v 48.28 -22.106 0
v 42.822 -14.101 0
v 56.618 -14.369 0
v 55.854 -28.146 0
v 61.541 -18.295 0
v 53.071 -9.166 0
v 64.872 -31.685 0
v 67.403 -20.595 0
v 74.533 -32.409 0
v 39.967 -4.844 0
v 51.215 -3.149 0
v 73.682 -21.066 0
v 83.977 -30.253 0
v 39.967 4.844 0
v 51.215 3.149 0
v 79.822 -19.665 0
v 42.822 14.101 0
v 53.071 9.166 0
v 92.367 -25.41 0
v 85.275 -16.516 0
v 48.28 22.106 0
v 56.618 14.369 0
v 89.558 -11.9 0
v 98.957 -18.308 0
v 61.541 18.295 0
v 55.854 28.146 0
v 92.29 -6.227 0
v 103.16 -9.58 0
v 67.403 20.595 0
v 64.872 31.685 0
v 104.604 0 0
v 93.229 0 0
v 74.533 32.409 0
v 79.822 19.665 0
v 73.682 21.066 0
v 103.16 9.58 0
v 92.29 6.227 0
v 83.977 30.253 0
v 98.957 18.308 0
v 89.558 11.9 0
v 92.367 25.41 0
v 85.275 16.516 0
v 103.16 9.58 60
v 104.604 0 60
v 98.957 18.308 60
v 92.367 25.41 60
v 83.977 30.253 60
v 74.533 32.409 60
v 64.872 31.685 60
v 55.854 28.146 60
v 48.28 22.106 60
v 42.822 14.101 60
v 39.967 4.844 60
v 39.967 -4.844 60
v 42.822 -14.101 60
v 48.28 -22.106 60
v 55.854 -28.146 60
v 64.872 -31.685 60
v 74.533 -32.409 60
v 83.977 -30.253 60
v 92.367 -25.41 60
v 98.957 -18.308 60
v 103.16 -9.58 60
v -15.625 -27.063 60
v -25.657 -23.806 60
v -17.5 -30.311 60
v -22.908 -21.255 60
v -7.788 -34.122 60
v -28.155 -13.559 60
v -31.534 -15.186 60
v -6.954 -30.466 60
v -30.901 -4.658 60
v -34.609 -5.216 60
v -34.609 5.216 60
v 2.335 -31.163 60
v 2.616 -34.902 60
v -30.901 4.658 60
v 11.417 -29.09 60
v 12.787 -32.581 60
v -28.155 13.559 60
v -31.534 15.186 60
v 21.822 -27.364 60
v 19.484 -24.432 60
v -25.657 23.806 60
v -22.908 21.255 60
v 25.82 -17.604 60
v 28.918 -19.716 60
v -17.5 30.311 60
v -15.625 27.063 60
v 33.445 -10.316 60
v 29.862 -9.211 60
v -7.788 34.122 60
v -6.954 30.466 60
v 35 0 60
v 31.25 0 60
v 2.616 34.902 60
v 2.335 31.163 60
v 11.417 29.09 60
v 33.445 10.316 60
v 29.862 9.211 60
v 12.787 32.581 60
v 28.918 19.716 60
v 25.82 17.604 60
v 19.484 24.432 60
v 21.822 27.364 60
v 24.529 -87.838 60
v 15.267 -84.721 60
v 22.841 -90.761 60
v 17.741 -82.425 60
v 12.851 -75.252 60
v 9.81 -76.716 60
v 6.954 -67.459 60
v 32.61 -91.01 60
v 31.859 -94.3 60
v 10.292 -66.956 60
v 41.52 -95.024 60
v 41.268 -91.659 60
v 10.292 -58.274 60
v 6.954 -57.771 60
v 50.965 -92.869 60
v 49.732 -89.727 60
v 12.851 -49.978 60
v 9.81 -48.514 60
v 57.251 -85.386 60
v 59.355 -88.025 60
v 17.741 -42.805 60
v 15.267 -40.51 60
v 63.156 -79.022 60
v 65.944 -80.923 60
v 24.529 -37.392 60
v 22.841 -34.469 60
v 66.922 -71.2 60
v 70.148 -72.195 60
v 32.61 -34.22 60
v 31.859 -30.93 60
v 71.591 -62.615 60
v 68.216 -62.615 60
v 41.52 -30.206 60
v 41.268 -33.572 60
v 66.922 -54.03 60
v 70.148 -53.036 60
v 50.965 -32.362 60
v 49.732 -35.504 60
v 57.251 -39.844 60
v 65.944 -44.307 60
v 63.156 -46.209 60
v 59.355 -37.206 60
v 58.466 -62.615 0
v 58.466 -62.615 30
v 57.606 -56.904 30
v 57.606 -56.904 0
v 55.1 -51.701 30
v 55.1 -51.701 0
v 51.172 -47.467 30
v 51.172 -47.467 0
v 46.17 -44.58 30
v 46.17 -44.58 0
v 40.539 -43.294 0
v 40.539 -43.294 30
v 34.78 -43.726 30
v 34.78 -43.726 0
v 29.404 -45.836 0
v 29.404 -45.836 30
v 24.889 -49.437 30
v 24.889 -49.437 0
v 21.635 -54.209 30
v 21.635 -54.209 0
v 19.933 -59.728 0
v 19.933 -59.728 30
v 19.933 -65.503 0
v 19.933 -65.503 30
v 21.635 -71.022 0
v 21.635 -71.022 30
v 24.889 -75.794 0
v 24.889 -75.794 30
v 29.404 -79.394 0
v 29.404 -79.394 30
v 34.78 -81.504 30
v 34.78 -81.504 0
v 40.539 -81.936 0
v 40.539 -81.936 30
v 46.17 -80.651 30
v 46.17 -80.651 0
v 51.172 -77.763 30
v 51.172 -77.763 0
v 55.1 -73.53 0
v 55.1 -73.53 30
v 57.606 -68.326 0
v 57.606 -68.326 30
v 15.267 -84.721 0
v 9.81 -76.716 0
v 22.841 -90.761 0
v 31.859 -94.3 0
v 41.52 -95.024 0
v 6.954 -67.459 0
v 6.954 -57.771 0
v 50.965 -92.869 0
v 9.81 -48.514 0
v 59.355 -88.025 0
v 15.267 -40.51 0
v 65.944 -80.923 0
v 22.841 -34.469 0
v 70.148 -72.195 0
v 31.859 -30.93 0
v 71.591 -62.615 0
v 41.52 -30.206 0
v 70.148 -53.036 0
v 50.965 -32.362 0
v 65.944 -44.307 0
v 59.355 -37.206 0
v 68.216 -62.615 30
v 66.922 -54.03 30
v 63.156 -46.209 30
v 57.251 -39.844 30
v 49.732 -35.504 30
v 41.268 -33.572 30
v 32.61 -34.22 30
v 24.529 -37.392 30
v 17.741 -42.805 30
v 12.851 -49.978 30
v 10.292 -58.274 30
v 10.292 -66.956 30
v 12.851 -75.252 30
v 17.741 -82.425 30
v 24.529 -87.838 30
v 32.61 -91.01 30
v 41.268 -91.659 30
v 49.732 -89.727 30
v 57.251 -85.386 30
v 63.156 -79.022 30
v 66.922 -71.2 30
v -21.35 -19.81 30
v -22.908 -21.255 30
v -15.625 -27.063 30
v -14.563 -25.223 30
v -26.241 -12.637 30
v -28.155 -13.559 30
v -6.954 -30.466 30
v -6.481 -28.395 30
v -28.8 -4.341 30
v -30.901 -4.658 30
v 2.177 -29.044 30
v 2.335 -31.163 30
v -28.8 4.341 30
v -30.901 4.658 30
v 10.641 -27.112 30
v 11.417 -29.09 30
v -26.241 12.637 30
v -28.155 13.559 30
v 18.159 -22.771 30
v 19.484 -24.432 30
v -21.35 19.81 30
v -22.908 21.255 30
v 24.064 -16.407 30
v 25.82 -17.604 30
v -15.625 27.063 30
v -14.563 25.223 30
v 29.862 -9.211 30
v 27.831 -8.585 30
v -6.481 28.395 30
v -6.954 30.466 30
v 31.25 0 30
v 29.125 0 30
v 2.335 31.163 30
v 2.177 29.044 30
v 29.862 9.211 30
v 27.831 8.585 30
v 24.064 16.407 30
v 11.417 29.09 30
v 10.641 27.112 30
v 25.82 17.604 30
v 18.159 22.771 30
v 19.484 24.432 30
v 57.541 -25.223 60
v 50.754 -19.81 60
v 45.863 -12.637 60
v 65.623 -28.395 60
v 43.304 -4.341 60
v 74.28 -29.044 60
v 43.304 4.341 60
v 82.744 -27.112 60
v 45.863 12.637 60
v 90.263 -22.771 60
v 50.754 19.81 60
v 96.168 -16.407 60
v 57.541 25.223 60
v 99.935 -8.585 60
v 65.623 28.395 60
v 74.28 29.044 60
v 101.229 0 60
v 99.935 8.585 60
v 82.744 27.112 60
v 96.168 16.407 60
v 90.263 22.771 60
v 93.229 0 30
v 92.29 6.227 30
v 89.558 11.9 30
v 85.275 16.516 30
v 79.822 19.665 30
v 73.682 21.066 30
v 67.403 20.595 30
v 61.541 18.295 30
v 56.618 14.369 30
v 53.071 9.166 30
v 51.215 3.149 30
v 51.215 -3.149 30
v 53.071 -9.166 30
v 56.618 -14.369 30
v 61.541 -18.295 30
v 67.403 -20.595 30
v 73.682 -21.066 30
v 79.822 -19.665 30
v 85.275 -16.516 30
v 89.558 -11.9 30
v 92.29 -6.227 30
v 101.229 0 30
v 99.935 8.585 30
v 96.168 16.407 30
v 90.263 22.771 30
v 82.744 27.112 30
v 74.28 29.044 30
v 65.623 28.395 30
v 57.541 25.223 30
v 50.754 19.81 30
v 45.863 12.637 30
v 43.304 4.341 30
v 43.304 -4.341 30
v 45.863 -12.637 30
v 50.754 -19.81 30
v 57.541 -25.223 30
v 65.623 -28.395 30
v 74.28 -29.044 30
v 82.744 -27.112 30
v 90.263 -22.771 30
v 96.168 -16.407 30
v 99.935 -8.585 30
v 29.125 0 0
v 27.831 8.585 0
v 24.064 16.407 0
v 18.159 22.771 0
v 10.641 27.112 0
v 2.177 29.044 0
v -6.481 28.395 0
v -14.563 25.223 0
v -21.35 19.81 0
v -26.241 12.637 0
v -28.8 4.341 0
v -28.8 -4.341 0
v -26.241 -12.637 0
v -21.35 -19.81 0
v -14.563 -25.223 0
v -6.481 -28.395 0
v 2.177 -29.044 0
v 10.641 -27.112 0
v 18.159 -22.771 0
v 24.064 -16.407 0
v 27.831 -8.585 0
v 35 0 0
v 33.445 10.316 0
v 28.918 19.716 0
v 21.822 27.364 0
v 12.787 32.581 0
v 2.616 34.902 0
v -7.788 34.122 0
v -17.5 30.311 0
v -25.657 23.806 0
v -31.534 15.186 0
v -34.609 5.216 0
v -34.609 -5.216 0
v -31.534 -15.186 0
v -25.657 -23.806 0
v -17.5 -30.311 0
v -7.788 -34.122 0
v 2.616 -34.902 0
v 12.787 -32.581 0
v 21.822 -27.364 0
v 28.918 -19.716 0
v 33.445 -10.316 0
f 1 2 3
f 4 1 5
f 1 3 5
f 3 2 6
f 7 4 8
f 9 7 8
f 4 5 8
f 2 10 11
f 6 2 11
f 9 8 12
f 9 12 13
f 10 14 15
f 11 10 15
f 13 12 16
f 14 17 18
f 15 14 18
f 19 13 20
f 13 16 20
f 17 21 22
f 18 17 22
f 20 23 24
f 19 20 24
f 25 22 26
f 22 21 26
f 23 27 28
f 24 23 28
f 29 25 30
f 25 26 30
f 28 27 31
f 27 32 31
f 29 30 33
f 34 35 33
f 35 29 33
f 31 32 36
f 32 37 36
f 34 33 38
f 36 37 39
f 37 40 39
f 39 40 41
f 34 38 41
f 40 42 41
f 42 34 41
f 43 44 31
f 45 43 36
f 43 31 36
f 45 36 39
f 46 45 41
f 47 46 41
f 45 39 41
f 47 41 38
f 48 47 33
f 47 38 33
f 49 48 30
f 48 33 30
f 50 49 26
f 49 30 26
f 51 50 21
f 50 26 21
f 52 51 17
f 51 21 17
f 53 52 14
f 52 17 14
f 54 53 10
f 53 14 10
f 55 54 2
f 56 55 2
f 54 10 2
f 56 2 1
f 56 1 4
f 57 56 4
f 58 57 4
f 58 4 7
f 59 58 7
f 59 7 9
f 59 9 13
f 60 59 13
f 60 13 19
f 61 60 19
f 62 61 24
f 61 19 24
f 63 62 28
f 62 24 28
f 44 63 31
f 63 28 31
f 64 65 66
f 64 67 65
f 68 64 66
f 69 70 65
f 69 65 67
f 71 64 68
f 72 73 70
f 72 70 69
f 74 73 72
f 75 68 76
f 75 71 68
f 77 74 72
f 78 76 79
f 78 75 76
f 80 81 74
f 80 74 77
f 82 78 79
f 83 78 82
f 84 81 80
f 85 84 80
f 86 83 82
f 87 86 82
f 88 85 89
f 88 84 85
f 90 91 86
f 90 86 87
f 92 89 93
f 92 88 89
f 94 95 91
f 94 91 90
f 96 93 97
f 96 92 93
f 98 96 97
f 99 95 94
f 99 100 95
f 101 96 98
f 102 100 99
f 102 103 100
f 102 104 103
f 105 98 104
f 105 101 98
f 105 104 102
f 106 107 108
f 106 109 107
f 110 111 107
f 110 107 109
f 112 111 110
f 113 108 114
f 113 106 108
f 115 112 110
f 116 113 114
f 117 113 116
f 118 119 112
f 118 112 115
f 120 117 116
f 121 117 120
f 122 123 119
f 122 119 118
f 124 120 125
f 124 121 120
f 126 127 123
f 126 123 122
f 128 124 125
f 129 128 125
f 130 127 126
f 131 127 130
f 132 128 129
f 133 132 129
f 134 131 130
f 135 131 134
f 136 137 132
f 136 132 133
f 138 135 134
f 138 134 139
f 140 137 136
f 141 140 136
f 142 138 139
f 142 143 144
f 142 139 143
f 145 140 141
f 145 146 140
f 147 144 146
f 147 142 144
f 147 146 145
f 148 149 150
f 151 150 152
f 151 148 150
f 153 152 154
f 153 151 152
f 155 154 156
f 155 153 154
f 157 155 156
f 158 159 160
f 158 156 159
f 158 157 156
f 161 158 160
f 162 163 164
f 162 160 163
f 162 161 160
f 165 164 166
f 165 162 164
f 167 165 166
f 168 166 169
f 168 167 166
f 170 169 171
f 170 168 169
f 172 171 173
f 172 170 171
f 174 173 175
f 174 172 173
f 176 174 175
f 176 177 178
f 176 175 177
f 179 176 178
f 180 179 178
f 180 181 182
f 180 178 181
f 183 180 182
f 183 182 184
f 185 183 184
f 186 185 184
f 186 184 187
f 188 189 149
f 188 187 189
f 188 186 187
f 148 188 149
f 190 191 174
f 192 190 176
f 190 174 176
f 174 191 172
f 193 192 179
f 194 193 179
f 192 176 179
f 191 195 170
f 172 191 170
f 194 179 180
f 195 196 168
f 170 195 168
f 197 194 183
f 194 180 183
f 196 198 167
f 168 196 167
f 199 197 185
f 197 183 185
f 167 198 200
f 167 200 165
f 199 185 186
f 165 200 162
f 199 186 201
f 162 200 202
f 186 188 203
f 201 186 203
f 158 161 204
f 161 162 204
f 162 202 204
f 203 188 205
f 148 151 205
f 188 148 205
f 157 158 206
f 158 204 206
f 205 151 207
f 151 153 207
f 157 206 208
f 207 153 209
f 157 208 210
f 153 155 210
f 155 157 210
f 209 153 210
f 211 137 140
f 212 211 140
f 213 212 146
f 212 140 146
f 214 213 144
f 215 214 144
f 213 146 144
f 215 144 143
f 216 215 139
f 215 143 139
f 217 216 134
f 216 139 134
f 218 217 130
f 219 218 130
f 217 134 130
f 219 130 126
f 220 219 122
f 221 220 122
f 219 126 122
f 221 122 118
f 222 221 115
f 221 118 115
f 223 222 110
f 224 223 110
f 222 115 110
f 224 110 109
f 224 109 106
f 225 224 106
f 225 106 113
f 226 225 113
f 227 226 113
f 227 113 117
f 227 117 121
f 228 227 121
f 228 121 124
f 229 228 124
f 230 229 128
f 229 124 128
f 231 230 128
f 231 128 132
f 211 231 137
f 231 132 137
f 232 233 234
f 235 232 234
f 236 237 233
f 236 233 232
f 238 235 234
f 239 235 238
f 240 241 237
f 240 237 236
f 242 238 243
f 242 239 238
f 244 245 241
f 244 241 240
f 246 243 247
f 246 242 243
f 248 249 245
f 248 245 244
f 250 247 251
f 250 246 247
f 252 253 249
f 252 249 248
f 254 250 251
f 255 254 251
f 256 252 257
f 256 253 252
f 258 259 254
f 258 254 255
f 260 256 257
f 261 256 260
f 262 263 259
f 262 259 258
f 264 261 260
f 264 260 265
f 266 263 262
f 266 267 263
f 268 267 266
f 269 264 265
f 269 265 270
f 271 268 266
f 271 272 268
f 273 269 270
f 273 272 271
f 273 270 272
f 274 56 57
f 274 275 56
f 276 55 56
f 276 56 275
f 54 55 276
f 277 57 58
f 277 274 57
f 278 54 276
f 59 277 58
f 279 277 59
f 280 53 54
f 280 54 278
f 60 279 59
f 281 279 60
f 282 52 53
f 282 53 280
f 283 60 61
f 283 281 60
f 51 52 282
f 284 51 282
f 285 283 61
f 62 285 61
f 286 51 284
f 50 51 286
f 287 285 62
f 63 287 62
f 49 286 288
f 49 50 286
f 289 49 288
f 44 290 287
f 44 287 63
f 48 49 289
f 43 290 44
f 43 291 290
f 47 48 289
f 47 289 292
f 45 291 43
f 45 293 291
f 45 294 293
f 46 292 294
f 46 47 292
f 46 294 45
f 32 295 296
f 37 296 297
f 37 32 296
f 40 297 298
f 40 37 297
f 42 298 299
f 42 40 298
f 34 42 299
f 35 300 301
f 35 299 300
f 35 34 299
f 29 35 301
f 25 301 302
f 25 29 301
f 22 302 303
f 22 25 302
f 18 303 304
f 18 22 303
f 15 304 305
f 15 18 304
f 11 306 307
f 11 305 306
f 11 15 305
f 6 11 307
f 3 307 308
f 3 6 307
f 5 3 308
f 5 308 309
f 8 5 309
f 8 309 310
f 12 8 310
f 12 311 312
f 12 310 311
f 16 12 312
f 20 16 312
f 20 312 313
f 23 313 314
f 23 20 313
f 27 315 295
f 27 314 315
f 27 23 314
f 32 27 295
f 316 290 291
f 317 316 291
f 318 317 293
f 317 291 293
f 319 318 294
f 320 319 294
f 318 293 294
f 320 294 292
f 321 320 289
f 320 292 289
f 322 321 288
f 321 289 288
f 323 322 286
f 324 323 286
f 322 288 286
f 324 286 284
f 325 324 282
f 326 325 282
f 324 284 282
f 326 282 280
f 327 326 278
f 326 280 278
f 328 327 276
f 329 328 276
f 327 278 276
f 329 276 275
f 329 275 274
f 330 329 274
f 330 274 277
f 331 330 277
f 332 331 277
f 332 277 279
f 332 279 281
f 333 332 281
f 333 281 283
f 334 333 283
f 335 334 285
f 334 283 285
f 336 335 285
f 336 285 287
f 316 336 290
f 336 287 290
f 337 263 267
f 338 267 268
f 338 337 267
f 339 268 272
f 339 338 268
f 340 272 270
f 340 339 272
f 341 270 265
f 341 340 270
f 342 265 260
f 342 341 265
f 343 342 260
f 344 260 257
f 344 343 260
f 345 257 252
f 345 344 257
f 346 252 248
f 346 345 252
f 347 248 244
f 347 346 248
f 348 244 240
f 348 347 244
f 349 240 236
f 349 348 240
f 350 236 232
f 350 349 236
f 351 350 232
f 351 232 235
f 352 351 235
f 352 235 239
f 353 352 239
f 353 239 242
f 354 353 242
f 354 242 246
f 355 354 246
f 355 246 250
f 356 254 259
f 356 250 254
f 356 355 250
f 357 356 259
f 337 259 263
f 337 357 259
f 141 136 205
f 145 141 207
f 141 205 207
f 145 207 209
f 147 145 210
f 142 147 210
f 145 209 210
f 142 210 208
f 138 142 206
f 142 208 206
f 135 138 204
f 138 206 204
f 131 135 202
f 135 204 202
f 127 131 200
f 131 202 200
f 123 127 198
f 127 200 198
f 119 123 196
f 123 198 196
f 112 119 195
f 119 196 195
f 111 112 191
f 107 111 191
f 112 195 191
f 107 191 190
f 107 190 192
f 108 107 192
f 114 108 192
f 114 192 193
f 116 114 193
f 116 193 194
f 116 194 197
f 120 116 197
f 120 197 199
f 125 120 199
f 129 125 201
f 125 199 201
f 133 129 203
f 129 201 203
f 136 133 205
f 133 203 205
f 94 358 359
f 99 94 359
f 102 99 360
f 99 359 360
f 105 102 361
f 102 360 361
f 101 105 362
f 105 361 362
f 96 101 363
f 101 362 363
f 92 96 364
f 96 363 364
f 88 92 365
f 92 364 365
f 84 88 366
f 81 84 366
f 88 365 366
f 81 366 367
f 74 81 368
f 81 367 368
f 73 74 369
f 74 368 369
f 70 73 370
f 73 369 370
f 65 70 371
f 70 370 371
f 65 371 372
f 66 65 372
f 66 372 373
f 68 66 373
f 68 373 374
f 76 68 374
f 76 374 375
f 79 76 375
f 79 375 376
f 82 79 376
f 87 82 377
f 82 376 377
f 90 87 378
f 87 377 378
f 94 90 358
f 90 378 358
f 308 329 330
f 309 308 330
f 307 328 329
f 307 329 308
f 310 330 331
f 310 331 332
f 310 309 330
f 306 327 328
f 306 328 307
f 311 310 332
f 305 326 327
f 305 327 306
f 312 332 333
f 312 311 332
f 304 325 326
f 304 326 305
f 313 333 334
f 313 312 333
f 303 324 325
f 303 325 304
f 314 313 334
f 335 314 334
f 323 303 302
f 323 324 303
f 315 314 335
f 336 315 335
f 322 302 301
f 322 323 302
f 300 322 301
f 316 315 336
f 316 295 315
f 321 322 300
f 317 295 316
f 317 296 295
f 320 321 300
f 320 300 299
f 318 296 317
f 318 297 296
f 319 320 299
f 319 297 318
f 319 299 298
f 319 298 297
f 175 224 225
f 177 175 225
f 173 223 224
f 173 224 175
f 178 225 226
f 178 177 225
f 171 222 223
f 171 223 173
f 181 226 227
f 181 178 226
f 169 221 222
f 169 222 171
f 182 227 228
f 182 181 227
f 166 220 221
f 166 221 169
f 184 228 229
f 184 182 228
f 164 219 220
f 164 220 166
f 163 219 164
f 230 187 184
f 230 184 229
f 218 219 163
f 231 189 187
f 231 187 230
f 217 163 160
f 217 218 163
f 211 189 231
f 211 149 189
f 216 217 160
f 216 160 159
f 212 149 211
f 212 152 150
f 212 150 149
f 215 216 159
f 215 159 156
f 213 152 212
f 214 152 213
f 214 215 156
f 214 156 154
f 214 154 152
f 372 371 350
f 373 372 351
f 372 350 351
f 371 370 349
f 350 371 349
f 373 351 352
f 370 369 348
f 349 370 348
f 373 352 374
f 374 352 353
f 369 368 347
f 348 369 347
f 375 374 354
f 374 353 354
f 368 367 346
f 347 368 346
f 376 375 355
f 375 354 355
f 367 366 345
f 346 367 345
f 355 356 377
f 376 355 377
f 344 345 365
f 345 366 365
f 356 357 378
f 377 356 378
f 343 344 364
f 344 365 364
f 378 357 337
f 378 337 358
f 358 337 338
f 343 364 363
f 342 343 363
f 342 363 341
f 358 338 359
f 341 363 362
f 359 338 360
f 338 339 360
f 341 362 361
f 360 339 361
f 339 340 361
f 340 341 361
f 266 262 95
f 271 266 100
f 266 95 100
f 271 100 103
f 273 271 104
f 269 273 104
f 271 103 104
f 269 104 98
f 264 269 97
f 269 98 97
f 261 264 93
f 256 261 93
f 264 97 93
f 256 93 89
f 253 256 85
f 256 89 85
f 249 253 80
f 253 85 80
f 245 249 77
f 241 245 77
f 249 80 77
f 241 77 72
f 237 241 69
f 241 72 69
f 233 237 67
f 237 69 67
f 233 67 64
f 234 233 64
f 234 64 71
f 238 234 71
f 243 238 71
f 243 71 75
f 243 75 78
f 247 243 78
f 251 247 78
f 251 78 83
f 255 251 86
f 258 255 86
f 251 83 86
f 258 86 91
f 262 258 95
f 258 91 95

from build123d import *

# Parameters (mm, degrees)
F0_R     = 35
F0_R_2   = 32.5
F1_DEPTH = 60
F2_R     = 29.125
F2_R_2   = 21.125
F2_R_3   = 19.375
F3_DEPTH = 60
F5_R     = 31.25
F5_R_2   = 29.125
F6_DEPTH = 30


with BuildPart() as f1:
    # F0 (on Top) → F1 (new body)
    with BuildSketch(Plane.XY):
        Circle(F0_R)
        with Locations((72.103776, 0)):
            Circle(F0_R_2)
        with Locations((39.091412, -62.615223)):
            Circle(F0_R_2)
    extrude(amount=F1_DEPTH)

    # F2 (on Top) → F3 (cut, through all)
    with BuildSketch(Plane.XY):
        Circle(F2_R)
        with Locations((72.103776, 0)):
            Circle(F2_R_2)
        with Locations((39.091412, -62.615223)):
            Circle(F2_R_3)
    extrude(amount=F3_DEPTH, mode=Mode.SUBTRACT)

    # F5 (on offset) → F6 (cut)
    with BuildSketch(Plane.XY.offset(60)):
        Circle(F5_R)
        with Locations((72.103776, 0)):
            Circle(F5_R_2)
        with Locations((39.091412, -62.615223)):
            Circle(F5_R_2)
    extrude(amount=-F6_DEPTH, mode=Mode.SUBTRACT)


solid = f1.part
